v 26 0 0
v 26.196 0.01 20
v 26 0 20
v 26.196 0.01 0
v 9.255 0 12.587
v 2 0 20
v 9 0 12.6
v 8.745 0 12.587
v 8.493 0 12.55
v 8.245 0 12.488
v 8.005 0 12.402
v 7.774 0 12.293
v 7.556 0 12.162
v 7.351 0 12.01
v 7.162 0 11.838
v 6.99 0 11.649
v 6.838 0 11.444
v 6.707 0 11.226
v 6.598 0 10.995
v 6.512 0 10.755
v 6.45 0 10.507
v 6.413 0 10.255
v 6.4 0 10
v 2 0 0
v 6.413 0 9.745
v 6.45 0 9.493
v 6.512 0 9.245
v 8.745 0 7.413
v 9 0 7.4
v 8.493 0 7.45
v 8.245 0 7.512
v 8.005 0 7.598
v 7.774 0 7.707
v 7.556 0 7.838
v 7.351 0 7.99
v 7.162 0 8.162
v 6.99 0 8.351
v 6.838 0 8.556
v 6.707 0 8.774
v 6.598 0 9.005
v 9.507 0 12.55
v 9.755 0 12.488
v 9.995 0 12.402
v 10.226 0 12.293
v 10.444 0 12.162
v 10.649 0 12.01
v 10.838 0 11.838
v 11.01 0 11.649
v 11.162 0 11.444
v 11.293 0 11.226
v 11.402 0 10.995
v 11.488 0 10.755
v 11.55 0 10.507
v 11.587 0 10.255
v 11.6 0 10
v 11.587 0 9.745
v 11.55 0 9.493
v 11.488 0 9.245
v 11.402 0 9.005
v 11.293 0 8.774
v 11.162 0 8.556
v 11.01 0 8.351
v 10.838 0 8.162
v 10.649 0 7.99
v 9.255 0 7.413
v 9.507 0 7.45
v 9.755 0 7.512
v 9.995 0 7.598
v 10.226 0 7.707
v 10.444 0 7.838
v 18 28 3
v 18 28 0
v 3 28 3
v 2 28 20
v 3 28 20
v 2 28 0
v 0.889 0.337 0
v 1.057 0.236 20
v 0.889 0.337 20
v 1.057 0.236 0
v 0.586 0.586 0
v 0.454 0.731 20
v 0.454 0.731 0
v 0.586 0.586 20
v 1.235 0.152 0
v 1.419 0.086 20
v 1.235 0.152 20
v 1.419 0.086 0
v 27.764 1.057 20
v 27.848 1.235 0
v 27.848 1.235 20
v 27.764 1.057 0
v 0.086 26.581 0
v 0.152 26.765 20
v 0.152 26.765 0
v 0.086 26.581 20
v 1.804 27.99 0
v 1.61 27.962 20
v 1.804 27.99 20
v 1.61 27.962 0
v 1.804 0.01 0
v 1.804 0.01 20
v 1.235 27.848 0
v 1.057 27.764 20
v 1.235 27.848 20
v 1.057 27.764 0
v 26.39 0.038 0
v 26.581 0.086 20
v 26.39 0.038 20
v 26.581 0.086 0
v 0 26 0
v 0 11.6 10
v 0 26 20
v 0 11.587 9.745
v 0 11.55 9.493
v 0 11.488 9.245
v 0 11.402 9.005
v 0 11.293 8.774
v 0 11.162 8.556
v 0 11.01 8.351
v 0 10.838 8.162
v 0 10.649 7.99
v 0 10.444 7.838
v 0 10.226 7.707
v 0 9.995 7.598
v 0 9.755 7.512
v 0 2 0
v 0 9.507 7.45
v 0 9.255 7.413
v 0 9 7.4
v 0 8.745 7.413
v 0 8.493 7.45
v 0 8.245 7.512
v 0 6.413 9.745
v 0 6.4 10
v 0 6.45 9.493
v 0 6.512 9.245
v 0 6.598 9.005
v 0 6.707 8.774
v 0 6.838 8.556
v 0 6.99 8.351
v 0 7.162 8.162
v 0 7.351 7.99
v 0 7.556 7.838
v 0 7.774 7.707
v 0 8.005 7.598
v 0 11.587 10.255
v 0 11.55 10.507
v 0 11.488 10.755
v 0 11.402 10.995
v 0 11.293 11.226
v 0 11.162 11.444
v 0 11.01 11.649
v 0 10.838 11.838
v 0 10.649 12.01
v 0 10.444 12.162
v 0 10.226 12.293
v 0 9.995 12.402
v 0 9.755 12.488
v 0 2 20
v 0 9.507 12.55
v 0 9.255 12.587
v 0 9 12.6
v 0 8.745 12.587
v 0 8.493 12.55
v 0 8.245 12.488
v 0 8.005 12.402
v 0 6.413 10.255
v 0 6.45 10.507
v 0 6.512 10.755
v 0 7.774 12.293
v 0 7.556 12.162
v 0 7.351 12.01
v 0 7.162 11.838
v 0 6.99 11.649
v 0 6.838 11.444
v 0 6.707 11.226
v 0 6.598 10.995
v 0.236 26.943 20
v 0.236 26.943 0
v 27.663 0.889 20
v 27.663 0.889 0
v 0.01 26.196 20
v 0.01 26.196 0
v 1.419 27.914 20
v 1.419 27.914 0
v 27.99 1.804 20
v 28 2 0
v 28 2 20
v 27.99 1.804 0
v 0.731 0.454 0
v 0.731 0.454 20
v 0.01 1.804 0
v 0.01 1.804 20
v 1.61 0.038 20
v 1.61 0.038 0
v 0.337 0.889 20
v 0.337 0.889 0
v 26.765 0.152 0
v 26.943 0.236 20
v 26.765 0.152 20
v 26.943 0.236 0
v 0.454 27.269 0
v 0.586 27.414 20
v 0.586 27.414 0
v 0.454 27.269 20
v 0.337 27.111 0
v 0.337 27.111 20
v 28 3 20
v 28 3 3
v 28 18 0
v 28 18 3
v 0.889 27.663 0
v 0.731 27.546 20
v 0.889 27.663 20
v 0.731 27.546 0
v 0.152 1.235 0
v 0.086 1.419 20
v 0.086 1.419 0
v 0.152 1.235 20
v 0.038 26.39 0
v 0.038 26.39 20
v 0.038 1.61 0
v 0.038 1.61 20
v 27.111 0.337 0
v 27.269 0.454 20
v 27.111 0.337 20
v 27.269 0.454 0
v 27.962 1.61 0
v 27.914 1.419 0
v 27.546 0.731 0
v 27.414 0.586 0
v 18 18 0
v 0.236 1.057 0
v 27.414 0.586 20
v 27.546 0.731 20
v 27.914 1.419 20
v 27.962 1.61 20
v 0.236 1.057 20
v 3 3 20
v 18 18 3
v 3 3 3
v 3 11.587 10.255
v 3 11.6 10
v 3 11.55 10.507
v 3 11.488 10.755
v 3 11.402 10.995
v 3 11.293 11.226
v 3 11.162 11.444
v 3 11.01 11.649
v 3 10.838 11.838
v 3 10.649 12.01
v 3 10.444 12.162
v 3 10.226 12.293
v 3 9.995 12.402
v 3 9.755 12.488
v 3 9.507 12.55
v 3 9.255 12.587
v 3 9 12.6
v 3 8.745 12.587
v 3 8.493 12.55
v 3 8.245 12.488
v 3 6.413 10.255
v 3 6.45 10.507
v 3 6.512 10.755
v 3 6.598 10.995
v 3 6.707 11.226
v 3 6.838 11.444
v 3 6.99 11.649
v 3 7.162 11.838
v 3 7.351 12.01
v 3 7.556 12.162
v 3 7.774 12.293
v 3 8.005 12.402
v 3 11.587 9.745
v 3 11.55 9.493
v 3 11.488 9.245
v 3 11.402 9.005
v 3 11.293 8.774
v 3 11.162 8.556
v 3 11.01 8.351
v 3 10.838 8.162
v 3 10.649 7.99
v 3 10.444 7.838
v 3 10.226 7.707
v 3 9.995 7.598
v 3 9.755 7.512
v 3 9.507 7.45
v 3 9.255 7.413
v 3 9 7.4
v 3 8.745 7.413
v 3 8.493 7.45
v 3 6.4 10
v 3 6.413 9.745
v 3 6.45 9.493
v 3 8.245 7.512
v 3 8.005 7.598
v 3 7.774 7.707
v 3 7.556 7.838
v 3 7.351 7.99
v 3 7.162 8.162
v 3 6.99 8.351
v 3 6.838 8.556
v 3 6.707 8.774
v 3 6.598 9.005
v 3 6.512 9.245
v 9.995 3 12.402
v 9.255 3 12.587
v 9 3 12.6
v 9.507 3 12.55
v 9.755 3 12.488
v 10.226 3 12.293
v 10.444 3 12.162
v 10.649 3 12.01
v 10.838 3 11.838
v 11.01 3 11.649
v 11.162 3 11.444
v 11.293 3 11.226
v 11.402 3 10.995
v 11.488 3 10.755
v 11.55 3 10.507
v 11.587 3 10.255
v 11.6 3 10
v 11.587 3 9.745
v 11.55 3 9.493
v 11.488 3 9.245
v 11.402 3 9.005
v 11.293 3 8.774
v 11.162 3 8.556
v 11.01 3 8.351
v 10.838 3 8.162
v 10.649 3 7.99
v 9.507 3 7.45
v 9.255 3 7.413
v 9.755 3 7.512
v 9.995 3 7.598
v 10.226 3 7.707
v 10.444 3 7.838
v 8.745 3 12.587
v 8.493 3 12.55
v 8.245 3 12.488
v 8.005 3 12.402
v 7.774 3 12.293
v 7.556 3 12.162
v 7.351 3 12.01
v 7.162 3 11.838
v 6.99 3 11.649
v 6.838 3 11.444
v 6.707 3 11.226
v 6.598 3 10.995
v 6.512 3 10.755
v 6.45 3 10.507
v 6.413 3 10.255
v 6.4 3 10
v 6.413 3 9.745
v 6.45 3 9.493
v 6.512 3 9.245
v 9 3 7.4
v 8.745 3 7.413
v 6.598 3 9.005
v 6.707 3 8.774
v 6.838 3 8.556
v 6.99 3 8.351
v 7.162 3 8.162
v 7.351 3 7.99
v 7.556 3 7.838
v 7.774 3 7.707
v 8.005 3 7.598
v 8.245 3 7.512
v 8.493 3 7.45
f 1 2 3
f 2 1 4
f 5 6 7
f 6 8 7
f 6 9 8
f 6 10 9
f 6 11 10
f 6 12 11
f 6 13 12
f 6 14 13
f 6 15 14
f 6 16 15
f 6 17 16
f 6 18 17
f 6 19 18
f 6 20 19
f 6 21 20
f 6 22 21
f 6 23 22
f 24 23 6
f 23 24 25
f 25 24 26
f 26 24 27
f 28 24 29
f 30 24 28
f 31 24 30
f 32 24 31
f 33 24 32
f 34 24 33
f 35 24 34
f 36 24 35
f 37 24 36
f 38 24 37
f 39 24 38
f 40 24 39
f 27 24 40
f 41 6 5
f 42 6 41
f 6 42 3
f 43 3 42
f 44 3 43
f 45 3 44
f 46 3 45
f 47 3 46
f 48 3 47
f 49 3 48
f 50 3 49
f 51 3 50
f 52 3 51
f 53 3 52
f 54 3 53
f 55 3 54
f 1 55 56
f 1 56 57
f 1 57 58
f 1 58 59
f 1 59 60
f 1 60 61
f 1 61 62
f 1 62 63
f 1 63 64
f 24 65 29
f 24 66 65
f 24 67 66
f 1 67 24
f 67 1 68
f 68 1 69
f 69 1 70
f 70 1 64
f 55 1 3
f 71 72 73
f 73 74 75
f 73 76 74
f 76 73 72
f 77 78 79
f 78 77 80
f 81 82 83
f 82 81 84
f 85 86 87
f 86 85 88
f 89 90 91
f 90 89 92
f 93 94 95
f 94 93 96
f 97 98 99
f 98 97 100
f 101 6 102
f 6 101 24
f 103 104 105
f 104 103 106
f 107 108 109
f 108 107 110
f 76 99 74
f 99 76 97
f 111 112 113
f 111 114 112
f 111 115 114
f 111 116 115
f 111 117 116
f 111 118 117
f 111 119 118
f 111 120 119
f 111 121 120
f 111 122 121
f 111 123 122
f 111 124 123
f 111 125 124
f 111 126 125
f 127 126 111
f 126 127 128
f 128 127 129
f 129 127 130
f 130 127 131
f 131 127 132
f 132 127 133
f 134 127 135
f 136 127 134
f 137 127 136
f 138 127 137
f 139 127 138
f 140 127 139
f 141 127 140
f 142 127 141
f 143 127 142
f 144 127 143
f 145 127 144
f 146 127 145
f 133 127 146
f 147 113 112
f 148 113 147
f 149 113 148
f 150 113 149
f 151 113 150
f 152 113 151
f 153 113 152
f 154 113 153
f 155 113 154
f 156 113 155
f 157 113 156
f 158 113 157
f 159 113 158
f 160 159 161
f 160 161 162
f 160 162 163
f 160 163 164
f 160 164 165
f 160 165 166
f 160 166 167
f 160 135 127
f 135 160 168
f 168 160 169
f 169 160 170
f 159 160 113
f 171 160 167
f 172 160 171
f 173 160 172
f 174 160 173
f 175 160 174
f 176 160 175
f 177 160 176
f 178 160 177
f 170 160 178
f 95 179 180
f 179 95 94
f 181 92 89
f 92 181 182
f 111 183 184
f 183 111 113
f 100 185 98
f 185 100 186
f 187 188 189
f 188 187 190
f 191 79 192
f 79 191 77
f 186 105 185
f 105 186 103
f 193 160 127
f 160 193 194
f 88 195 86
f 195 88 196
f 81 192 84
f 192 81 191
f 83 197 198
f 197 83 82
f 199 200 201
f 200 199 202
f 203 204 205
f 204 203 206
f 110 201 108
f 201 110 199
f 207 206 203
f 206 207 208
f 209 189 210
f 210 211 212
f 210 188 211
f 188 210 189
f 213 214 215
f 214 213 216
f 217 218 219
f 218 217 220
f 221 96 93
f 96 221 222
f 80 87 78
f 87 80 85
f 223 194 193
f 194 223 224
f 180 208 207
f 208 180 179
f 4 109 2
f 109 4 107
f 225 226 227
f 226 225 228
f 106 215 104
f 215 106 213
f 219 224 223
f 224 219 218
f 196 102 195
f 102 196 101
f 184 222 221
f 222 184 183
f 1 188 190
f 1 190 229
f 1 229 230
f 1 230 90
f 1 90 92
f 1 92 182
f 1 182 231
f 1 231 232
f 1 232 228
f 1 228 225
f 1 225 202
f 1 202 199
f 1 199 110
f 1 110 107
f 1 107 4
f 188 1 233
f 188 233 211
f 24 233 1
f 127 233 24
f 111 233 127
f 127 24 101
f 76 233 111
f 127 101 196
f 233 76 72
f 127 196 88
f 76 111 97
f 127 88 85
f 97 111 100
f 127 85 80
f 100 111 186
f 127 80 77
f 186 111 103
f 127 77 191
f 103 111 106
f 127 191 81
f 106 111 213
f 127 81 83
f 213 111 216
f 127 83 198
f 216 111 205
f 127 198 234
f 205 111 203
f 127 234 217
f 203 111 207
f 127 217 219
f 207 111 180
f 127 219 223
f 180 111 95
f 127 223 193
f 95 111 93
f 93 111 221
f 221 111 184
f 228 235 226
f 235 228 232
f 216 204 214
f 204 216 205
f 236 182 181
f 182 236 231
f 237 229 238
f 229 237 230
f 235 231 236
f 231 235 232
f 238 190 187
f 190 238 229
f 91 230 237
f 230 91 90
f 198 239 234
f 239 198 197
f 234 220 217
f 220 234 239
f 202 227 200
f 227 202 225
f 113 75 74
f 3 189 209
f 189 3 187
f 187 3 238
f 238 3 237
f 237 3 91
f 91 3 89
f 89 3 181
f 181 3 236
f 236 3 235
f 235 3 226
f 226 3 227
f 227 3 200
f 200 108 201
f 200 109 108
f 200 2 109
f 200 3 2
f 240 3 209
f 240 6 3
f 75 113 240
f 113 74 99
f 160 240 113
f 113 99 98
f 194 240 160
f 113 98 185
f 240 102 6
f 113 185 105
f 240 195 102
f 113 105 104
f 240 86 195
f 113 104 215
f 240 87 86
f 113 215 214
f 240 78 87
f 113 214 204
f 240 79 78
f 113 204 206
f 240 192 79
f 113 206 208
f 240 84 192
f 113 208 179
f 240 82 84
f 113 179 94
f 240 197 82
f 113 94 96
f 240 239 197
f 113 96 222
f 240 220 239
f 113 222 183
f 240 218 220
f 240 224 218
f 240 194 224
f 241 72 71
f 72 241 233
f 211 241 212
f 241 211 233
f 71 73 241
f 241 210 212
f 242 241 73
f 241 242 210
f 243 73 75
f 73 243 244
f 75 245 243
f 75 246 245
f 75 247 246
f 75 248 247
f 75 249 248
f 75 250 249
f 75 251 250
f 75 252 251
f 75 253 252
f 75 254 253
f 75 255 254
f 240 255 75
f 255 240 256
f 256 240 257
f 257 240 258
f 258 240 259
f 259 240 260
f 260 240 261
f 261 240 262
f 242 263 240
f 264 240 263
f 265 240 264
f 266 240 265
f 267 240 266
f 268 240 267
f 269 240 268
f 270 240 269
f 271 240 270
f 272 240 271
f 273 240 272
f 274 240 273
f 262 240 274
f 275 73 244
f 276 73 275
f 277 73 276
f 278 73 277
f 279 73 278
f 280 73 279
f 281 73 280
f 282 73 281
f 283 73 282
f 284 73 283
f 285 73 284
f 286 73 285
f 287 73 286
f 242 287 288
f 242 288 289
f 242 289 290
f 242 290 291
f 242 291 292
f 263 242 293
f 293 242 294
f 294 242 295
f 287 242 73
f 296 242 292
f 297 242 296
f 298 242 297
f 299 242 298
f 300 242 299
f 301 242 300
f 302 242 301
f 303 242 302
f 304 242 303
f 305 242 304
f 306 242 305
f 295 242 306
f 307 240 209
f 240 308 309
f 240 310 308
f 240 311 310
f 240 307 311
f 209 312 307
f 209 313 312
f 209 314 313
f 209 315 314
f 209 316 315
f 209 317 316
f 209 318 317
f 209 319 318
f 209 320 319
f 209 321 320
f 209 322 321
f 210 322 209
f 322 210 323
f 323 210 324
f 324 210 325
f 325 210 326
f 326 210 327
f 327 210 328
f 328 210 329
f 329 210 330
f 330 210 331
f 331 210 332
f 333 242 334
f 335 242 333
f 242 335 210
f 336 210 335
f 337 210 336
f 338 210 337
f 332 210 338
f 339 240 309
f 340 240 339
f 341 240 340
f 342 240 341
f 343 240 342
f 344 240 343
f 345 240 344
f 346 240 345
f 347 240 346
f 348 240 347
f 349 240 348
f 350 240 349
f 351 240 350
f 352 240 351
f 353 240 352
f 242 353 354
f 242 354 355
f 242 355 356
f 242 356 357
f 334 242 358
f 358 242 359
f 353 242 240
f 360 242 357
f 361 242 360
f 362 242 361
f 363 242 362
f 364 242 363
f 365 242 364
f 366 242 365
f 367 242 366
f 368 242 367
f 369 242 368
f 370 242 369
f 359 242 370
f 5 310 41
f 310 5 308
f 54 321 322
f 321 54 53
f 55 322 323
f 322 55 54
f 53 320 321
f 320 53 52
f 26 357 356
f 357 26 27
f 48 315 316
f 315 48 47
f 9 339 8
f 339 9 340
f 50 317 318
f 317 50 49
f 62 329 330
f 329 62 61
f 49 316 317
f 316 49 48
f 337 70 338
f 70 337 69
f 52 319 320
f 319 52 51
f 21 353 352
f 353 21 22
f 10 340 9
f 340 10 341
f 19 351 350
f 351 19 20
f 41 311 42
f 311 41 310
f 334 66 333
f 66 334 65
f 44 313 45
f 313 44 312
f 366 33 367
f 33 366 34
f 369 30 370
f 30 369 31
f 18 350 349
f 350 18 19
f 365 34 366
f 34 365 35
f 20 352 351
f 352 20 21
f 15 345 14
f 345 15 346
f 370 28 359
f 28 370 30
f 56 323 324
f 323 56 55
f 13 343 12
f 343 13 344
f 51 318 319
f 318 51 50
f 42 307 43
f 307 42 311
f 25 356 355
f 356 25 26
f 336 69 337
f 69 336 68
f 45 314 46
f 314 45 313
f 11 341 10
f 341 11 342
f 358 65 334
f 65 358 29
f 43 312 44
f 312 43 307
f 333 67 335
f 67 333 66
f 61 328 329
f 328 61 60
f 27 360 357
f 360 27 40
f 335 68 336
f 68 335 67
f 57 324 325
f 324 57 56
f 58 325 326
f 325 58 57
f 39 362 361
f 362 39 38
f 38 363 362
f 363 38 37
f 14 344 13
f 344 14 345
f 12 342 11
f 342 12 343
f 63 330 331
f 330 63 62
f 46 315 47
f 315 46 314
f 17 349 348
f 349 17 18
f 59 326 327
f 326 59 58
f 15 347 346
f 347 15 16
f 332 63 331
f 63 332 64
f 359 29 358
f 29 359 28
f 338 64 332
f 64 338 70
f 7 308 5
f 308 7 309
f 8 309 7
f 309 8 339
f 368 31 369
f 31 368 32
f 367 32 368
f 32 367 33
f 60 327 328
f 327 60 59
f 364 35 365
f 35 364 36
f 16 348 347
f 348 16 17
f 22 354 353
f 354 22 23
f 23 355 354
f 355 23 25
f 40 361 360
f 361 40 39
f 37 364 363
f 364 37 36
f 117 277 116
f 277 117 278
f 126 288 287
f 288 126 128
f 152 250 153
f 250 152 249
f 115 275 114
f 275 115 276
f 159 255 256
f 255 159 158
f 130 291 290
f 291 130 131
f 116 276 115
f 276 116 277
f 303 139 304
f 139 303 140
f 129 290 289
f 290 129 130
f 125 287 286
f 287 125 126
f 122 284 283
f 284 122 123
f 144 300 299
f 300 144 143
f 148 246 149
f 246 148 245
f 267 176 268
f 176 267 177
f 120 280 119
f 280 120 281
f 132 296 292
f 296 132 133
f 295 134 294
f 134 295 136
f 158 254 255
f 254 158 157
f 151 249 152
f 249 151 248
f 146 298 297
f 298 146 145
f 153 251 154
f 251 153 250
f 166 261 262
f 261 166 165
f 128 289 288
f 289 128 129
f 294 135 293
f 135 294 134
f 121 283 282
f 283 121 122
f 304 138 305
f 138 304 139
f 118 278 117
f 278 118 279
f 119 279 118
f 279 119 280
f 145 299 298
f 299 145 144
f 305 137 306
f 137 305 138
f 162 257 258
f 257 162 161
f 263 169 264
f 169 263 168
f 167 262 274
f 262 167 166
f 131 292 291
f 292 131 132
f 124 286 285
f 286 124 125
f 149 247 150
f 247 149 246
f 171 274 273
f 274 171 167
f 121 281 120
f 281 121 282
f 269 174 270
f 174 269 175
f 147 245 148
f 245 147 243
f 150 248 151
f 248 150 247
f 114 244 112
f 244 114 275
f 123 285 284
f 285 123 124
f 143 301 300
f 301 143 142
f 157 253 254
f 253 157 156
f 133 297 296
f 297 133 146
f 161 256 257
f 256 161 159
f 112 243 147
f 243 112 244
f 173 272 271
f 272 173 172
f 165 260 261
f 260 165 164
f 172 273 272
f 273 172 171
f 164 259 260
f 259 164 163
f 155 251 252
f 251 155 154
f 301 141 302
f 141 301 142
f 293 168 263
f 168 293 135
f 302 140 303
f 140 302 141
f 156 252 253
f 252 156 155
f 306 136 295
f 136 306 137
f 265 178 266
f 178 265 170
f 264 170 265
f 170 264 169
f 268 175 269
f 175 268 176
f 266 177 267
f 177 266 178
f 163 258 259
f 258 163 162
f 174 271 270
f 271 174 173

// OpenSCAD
$fn = 64;

size = [28, 28, 20];   // overall bounding box [X,Y,Z]
wall = 3;              // wall thickness
leg = 18;              // length of each leg along X and Y
hole_d = 5.2;          // clearance hole
csk_d = 9.5;           // countersink diameter
csk_h = 2.5;           // countersink height
fillet_r = 2;          // outer corner fillet radius

module rounded_box(sz=[10,10,10], r=1){
    r2 = min(r, sz[0]/2, sz[1]/2);
    linear_extrude(height=sz[2])
        offset(r=r2)
            square([sz[0]-2*r2, sz[1]-2*r2], center=true);
}

module extrusion_bracket(){
    // L-bracket body (two legs)
    difference(){
        union(){
            // Outer shape with filleted outer corner
            translate([size[0]/2, size[1]/2, 0])
                rounded_box([size[0], size[1], size[2]], fillet_r);

            // Remove the missing quadrant to form an L (keep two legs)
            // We'll subtract a block from the top-right area leaving legs of length 'leg'
        }
        // Cut out the quadrant to make L shape
        translate([leg, leg, -0.1])
            cube([size[0]-leg+0.2, size[1]-leg+0.2, size[2]+0.2], center=false);

        // Hollow underside to create bracket walls (optional pocket)
        translate([wall, wall, wall])
            cube([size[0]-wall+0.01, size[1]-wall+0.01, size[2]-wall+0.2], center=false);

        // Through holes: one on each leg
        // X-leg hole
        translate([leg/2, wall + (leg-wall)/2, size[2]/2])
            rotate([90,0,0])
                cylinder(d=hole_d, h=size[1]+2, center=true);

        // Y-leg hole
        translate([wall + (leg-wall)/2, leg/2, size[2]/2])
            rotate([0,90,0])
                cylinder(d=hole_d, h=size[0]+2, center=true);

        // Countersinks on top face for both holes
        // X-leg countersink
        translate([leg/2, wall + (leg-wall)/2, size[2]-csk_h])
            rotate([90,0,0])
                cylinder(d1=csk_d, d2=hole_d, h=csk_h+0.01, center=false);

        // Y-leg countersink
        translate([wall + (leg-wall)/2, leg/2, size[2]-csk_h])
            rotate([0,90,0])
                cylinder(d1=csk_d, d2=hole_d, h=csk_h+0.01, center=false);
    }
}

extrusion_bracket();
